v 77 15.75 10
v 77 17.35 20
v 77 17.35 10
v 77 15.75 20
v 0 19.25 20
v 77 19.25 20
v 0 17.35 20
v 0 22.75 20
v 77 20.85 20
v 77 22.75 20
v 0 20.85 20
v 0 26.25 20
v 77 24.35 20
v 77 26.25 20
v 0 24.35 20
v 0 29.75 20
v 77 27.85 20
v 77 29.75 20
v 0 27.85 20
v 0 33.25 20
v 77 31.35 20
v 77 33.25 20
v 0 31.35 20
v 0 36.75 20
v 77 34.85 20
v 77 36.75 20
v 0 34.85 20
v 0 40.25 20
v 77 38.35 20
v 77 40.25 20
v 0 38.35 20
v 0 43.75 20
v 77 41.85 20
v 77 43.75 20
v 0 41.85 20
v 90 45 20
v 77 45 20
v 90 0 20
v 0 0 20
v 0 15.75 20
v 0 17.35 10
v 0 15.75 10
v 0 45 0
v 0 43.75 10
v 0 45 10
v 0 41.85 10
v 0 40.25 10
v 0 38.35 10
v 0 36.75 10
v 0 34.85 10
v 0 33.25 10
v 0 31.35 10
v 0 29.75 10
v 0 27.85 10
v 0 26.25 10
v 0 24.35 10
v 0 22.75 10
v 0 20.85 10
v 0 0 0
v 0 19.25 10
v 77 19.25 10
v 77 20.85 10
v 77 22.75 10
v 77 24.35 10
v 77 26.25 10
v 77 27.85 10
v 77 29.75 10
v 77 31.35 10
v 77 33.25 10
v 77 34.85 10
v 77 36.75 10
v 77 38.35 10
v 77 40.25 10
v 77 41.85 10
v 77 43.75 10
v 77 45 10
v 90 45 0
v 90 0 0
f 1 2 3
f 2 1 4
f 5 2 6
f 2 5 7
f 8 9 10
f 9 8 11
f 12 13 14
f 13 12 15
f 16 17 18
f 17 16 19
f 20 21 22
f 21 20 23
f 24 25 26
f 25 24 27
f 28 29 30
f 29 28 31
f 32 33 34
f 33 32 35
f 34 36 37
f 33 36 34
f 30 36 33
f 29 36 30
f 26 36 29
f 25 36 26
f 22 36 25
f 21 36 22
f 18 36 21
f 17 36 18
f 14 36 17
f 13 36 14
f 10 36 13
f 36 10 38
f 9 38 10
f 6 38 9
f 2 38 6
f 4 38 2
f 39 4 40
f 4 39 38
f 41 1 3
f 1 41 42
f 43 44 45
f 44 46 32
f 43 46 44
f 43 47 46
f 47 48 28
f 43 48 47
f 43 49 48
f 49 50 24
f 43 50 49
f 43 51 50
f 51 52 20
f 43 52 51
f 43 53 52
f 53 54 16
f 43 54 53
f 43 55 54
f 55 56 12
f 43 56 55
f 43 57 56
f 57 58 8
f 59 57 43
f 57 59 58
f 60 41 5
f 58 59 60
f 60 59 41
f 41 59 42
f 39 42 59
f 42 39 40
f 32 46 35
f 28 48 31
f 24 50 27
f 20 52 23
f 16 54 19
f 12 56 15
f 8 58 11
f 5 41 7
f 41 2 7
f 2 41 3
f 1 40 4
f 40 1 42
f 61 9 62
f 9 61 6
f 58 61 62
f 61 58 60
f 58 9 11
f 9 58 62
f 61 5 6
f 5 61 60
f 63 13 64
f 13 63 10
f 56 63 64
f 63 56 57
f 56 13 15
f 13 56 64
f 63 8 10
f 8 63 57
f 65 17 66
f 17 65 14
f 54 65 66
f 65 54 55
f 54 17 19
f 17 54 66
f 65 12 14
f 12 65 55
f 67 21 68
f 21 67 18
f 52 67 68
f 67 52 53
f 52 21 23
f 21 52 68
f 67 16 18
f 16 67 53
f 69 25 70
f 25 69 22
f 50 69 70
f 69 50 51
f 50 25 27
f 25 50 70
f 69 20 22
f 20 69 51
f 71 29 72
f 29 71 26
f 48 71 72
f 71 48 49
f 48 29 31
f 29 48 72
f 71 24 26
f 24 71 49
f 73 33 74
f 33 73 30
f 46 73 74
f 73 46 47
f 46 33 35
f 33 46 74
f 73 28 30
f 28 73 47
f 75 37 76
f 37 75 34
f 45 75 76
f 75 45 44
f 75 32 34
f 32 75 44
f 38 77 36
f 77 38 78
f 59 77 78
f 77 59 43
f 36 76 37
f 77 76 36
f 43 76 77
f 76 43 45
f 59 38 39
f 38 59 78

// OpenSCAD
// Drying Rack for 10 Microscope Slides
// Base: 90mm (X) x 45mm (Y) x 20mm (Z)
// Slots: 10 parallel slots along X, 77mm long, 1.6mm wide, 10mm deep
// Spacing: 3.5mm centre-to-centre (Y), group centred on block

$fn = 128;

// Base Dimensions
base_length_X = 90;
base_width_Y = 45;
base_height_Z = 20;

// Slide Dimensions (for reference)
slide_length = 75;
slide_width = 25;
slide_thickness = 1;

// Slot Dimensions
slot_length_X = 77;
slot_width_Y = 1.6;
slot_depth_Z = 10;

// Layout Dimensions
slot_spacing_Y = 3.5; // Centre-to-centre
num_slots = 10;

// Calculate Y position of the first slot centre
// Total width of slots = num_slots * slot_width_Y
// Total width of gaps = (num_slots - 1) * slot_spacing_Y
// Total occupied width = num_slots * slot_width_Y + (num_slots - 1) * slot_spacing_Y
// Remaining width = base_width_Y - Total occupied width
// Offset from edge = Remaining width / 2
// First slot Y = Offset + (slot_width_Y / 2) + (slot_spacing_Y / 2)
// Actually, simpler: The group is centred.
// Distance from centre to first slot centre = (num_slots - 1) * slot_spacing_Y / 2
offset_Y_first = ((num_slots - 1) * slot_spacing_Y) / 2;

// Generate the base block
difference() {
    // Main Block
    cube([base_length_X, base_width_Y, base_height_Z]);
    
    // Cut Slots
    for (i = [0 : num_slots - 1]) {
        // Calculate Y position for this slot
        y_pos = offset_Y_first + (i * slot_spacing_Y);
        
        // Slot geometry:
        // Length along X: slot_length_X
        // Width along Y: slot_width_Y
        // Depth along Z: slot_depth_Z
        // Position: X is centred (0), Y is y_pos, Z starts at base_height_Z - slot_depth_Z
        
        translate([0, y_pos, base_height_Z - slot_depth_Z]) {
            cube([slot_length_X, slot_width_Y, slot_depth_Z]);
        }
    }
}
